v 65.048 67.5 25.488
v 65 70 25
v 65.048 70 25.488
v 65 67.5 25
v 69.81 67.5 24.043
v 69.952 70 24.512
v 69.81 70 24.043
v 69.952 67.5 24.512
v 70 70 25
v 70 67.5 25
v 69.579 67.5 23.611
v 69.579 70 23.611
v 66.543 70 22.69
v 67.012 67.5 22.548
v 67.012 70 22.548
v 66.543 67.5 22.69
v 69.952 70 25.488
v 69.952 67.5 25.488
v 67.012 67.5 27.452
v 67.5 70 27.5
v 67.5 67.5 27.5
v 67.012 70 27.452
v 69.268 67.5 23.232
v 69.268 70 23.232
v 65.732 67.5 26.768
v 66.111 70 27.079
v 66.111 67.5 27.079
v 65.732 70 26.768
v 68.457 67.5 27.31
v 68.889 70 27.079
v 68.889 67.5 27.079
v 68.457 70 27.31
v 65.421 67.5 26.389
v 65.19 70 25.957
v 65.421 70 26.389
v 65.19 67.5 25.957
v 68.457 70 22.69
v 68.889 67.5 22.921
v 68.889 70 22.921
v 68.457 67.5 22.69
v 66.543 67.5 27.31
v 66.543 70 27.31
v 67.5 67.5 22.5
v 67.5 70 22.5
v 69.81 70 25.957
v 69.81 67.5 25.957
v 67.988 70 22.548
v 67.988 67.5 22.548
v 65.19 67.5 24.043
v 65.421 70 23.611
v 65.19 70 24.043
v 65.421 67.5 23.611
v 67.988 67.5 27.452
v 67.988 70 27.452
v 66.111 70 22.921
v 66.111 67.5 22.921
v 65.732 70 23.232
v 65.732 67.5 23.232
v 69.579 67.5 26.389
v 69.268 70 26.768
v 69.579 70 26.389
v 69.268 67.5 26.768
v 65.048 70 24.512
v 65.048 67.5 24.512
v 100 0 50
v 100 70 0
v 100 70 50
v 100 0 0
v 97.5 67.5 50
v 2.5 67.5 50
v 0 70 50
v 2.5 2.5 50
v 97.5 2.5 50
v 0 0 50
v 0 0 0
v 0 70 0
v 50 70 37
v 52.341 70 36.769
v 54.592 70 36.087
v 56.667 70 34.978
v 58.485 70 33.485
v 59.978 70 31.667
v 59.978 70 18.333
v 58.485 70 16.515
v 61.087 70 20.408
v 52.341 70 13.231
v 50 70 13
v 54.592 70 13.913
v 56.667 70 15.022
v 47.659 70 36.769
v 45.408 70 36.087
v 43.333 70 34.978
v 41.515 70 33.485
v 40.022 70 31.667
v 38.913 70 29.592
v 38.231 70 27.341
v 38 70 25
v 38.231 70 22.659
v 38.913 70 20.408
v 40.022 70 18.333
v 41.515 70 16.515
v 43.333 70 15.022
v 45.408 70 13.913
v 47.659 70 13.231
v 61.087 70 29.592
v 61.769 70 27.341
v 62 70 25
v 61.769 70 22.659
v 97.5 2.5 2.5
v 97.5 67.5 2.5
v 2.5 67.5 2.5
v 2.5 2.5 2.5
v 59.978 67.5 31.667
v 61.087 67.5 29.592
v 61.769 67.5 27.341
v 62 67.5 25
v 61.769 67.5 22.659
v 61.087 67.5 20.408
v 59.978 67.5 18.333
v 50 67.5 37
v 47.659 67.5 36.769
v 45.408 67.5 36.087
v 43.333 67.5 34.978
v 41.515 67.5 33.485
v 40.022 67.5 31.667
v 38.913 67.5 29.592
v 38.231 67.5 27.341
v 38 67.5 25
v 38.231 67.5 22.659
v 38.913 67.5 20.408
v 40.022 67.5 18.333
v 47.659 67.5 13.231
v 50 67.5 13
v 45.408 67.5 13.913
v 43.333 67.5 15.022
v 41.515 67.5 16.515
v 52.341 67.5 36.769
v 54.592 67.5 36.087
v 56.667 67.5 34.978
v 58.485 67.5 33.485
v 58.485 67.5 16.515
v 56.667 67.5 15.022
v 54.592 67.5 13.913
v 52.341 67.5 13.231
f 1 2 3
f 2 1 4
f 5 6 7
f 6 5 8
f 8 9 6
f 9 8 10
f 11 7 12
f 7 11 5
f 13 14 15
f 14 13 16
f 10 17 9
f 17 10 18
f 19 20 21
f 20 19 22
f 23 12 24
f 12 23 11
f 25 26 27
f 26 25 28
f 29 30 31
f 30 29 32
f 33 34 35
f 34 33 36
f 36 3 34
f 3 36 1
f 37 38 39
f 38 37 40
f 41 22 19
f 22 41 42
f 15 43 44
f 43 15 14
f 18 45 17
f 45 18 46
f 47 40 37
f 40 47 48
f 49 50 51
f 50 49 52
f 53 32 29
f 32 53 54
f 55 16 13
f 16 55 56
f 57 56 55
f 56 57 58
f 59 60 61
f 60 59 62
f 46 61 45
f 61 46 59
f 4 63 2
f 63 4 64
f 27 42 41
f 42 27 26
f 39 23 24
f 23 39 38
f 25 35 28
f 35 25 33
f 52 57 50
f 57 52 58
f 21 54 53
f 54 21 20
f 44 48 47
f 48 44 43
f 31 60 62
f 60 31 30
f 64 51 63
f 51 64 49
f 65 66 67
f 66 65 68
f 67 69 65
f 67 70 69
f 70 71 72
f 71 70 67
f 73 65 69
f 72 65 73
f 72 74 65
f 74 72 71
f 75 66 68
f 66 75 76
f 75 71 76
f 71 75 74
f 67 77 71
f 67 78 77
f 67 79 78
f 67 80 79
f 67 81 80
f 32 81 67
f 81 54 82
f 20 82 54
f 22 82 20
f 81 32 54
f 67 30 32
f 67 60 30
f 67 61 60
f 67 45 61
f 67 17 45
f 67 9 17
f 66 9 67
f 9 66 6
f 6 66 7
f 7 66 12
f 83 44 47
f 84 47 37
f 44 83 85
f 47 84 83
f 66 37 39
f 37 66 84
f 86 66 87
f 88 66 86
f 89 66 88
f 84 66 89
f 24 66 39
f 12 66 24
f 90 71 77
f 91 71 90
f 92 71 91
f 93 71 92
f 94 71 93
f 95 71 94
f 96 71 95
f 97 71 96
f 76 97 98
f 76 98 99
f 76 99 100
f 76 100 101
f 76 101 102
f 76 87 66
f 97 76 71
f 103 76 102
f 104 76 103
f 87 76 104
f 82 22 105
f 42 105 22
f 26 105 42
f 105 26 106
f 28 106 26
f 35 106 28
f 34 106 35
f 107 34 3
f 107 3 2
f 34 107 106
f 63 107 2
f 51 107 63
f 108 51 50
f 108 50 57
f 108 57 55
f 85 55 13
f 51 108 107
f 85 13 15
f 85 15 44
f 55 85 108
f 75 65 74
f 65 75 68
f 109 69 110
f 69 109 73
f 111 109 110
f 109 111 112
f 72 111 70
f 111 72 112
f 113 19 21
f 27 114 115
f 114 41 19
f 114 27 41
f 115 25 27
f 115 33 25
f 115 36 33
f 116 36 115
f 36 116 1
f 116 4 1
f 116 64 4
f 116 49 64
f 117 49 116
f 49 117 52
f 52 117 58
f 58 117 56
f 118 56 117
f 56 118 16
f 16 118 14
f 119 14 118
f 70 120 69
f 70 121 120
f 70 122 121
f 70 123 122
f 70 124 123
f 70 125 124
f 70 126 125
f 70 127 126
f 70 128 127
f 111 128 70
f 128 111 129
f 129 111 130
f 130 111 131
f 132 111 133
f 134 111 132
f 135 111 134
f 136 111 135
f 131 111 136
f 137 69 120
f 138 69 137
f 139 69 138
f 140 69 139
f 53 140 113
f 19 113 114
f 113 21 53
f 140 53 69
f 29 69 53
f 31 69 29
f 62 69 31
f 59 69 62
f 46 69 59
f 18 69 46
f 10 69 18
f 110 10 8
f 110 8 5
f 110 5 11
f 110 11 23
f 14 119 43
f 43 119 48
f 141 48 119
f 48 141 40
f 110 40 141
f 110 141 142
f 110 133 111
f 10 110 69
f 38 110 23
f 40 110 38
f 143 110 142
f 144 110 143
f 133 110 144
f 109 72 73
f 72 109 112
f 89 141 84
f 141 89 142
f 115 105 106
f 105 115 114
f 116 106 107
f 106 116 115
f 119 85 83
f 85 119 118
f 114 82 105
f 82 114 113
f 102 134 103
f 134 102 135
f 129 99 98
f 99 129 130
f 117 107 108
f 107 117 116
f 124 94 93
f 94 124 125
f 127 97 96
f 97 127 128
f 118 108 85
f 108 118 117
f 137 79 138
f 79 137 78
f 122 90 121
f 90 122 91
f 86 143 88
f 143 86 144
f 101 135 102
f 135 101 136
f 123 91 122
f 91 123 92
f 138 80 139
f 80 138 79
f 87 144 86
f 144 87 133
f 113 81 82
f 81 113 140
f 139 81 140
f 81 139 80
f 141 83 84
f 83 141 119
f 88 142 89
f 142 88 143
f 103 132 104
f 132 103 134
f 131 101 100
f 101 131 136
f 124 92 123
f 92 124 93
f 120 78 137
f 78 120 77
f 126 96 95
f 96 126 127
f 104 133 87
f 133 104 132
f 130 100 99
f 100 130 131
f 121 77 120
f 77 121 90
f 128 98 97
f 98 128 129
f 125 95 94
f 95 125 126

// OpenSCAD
$fn = 32;

// ----------------------------------------------------------------------
// Vent box: roundvent enclosure
// ----------------------------------------------------------------------

// --- parameters (mm) ---
box_l = 100;              // box length, X
box_w = 70;               // box width, Y
box_h = 50;               // box height, Z
wall_t = 2.5;             // shell wall thickness
vent_d = 24;              // central vent diameter
ring_d = 5;               // ring hole diameter
n_ring = 6;               // holes in the ring
ring_r = 17.5;            // ring radius

ring_step = 360 / n_ring;  // ring hole angular step

difference() {
  cube([box_l, box_w, box_h]);
  translate([wall_t, wall_t, wall_t])
    cube([box_l - 2 * wall_t, box_w - 2 * wall_t, box_h]);
  translate([box_l / 2, box_w - wall_t - 1, box_h / 2])
    rotate([-90, 0, 0]) cylinder(h = wall_t + 2, d = vent_d);
  for (i = [0 : n_ring - 1])
    translate([box_l / 2, box_w - wall_t - 1, box_h / 2])
      rotate([0, 0, i * ring_step])
        translate([ring_r, 0, 0]) rotate([-90, 0, 0])
          cylinder(h = wall_t + 2, d = ring_d);
}
